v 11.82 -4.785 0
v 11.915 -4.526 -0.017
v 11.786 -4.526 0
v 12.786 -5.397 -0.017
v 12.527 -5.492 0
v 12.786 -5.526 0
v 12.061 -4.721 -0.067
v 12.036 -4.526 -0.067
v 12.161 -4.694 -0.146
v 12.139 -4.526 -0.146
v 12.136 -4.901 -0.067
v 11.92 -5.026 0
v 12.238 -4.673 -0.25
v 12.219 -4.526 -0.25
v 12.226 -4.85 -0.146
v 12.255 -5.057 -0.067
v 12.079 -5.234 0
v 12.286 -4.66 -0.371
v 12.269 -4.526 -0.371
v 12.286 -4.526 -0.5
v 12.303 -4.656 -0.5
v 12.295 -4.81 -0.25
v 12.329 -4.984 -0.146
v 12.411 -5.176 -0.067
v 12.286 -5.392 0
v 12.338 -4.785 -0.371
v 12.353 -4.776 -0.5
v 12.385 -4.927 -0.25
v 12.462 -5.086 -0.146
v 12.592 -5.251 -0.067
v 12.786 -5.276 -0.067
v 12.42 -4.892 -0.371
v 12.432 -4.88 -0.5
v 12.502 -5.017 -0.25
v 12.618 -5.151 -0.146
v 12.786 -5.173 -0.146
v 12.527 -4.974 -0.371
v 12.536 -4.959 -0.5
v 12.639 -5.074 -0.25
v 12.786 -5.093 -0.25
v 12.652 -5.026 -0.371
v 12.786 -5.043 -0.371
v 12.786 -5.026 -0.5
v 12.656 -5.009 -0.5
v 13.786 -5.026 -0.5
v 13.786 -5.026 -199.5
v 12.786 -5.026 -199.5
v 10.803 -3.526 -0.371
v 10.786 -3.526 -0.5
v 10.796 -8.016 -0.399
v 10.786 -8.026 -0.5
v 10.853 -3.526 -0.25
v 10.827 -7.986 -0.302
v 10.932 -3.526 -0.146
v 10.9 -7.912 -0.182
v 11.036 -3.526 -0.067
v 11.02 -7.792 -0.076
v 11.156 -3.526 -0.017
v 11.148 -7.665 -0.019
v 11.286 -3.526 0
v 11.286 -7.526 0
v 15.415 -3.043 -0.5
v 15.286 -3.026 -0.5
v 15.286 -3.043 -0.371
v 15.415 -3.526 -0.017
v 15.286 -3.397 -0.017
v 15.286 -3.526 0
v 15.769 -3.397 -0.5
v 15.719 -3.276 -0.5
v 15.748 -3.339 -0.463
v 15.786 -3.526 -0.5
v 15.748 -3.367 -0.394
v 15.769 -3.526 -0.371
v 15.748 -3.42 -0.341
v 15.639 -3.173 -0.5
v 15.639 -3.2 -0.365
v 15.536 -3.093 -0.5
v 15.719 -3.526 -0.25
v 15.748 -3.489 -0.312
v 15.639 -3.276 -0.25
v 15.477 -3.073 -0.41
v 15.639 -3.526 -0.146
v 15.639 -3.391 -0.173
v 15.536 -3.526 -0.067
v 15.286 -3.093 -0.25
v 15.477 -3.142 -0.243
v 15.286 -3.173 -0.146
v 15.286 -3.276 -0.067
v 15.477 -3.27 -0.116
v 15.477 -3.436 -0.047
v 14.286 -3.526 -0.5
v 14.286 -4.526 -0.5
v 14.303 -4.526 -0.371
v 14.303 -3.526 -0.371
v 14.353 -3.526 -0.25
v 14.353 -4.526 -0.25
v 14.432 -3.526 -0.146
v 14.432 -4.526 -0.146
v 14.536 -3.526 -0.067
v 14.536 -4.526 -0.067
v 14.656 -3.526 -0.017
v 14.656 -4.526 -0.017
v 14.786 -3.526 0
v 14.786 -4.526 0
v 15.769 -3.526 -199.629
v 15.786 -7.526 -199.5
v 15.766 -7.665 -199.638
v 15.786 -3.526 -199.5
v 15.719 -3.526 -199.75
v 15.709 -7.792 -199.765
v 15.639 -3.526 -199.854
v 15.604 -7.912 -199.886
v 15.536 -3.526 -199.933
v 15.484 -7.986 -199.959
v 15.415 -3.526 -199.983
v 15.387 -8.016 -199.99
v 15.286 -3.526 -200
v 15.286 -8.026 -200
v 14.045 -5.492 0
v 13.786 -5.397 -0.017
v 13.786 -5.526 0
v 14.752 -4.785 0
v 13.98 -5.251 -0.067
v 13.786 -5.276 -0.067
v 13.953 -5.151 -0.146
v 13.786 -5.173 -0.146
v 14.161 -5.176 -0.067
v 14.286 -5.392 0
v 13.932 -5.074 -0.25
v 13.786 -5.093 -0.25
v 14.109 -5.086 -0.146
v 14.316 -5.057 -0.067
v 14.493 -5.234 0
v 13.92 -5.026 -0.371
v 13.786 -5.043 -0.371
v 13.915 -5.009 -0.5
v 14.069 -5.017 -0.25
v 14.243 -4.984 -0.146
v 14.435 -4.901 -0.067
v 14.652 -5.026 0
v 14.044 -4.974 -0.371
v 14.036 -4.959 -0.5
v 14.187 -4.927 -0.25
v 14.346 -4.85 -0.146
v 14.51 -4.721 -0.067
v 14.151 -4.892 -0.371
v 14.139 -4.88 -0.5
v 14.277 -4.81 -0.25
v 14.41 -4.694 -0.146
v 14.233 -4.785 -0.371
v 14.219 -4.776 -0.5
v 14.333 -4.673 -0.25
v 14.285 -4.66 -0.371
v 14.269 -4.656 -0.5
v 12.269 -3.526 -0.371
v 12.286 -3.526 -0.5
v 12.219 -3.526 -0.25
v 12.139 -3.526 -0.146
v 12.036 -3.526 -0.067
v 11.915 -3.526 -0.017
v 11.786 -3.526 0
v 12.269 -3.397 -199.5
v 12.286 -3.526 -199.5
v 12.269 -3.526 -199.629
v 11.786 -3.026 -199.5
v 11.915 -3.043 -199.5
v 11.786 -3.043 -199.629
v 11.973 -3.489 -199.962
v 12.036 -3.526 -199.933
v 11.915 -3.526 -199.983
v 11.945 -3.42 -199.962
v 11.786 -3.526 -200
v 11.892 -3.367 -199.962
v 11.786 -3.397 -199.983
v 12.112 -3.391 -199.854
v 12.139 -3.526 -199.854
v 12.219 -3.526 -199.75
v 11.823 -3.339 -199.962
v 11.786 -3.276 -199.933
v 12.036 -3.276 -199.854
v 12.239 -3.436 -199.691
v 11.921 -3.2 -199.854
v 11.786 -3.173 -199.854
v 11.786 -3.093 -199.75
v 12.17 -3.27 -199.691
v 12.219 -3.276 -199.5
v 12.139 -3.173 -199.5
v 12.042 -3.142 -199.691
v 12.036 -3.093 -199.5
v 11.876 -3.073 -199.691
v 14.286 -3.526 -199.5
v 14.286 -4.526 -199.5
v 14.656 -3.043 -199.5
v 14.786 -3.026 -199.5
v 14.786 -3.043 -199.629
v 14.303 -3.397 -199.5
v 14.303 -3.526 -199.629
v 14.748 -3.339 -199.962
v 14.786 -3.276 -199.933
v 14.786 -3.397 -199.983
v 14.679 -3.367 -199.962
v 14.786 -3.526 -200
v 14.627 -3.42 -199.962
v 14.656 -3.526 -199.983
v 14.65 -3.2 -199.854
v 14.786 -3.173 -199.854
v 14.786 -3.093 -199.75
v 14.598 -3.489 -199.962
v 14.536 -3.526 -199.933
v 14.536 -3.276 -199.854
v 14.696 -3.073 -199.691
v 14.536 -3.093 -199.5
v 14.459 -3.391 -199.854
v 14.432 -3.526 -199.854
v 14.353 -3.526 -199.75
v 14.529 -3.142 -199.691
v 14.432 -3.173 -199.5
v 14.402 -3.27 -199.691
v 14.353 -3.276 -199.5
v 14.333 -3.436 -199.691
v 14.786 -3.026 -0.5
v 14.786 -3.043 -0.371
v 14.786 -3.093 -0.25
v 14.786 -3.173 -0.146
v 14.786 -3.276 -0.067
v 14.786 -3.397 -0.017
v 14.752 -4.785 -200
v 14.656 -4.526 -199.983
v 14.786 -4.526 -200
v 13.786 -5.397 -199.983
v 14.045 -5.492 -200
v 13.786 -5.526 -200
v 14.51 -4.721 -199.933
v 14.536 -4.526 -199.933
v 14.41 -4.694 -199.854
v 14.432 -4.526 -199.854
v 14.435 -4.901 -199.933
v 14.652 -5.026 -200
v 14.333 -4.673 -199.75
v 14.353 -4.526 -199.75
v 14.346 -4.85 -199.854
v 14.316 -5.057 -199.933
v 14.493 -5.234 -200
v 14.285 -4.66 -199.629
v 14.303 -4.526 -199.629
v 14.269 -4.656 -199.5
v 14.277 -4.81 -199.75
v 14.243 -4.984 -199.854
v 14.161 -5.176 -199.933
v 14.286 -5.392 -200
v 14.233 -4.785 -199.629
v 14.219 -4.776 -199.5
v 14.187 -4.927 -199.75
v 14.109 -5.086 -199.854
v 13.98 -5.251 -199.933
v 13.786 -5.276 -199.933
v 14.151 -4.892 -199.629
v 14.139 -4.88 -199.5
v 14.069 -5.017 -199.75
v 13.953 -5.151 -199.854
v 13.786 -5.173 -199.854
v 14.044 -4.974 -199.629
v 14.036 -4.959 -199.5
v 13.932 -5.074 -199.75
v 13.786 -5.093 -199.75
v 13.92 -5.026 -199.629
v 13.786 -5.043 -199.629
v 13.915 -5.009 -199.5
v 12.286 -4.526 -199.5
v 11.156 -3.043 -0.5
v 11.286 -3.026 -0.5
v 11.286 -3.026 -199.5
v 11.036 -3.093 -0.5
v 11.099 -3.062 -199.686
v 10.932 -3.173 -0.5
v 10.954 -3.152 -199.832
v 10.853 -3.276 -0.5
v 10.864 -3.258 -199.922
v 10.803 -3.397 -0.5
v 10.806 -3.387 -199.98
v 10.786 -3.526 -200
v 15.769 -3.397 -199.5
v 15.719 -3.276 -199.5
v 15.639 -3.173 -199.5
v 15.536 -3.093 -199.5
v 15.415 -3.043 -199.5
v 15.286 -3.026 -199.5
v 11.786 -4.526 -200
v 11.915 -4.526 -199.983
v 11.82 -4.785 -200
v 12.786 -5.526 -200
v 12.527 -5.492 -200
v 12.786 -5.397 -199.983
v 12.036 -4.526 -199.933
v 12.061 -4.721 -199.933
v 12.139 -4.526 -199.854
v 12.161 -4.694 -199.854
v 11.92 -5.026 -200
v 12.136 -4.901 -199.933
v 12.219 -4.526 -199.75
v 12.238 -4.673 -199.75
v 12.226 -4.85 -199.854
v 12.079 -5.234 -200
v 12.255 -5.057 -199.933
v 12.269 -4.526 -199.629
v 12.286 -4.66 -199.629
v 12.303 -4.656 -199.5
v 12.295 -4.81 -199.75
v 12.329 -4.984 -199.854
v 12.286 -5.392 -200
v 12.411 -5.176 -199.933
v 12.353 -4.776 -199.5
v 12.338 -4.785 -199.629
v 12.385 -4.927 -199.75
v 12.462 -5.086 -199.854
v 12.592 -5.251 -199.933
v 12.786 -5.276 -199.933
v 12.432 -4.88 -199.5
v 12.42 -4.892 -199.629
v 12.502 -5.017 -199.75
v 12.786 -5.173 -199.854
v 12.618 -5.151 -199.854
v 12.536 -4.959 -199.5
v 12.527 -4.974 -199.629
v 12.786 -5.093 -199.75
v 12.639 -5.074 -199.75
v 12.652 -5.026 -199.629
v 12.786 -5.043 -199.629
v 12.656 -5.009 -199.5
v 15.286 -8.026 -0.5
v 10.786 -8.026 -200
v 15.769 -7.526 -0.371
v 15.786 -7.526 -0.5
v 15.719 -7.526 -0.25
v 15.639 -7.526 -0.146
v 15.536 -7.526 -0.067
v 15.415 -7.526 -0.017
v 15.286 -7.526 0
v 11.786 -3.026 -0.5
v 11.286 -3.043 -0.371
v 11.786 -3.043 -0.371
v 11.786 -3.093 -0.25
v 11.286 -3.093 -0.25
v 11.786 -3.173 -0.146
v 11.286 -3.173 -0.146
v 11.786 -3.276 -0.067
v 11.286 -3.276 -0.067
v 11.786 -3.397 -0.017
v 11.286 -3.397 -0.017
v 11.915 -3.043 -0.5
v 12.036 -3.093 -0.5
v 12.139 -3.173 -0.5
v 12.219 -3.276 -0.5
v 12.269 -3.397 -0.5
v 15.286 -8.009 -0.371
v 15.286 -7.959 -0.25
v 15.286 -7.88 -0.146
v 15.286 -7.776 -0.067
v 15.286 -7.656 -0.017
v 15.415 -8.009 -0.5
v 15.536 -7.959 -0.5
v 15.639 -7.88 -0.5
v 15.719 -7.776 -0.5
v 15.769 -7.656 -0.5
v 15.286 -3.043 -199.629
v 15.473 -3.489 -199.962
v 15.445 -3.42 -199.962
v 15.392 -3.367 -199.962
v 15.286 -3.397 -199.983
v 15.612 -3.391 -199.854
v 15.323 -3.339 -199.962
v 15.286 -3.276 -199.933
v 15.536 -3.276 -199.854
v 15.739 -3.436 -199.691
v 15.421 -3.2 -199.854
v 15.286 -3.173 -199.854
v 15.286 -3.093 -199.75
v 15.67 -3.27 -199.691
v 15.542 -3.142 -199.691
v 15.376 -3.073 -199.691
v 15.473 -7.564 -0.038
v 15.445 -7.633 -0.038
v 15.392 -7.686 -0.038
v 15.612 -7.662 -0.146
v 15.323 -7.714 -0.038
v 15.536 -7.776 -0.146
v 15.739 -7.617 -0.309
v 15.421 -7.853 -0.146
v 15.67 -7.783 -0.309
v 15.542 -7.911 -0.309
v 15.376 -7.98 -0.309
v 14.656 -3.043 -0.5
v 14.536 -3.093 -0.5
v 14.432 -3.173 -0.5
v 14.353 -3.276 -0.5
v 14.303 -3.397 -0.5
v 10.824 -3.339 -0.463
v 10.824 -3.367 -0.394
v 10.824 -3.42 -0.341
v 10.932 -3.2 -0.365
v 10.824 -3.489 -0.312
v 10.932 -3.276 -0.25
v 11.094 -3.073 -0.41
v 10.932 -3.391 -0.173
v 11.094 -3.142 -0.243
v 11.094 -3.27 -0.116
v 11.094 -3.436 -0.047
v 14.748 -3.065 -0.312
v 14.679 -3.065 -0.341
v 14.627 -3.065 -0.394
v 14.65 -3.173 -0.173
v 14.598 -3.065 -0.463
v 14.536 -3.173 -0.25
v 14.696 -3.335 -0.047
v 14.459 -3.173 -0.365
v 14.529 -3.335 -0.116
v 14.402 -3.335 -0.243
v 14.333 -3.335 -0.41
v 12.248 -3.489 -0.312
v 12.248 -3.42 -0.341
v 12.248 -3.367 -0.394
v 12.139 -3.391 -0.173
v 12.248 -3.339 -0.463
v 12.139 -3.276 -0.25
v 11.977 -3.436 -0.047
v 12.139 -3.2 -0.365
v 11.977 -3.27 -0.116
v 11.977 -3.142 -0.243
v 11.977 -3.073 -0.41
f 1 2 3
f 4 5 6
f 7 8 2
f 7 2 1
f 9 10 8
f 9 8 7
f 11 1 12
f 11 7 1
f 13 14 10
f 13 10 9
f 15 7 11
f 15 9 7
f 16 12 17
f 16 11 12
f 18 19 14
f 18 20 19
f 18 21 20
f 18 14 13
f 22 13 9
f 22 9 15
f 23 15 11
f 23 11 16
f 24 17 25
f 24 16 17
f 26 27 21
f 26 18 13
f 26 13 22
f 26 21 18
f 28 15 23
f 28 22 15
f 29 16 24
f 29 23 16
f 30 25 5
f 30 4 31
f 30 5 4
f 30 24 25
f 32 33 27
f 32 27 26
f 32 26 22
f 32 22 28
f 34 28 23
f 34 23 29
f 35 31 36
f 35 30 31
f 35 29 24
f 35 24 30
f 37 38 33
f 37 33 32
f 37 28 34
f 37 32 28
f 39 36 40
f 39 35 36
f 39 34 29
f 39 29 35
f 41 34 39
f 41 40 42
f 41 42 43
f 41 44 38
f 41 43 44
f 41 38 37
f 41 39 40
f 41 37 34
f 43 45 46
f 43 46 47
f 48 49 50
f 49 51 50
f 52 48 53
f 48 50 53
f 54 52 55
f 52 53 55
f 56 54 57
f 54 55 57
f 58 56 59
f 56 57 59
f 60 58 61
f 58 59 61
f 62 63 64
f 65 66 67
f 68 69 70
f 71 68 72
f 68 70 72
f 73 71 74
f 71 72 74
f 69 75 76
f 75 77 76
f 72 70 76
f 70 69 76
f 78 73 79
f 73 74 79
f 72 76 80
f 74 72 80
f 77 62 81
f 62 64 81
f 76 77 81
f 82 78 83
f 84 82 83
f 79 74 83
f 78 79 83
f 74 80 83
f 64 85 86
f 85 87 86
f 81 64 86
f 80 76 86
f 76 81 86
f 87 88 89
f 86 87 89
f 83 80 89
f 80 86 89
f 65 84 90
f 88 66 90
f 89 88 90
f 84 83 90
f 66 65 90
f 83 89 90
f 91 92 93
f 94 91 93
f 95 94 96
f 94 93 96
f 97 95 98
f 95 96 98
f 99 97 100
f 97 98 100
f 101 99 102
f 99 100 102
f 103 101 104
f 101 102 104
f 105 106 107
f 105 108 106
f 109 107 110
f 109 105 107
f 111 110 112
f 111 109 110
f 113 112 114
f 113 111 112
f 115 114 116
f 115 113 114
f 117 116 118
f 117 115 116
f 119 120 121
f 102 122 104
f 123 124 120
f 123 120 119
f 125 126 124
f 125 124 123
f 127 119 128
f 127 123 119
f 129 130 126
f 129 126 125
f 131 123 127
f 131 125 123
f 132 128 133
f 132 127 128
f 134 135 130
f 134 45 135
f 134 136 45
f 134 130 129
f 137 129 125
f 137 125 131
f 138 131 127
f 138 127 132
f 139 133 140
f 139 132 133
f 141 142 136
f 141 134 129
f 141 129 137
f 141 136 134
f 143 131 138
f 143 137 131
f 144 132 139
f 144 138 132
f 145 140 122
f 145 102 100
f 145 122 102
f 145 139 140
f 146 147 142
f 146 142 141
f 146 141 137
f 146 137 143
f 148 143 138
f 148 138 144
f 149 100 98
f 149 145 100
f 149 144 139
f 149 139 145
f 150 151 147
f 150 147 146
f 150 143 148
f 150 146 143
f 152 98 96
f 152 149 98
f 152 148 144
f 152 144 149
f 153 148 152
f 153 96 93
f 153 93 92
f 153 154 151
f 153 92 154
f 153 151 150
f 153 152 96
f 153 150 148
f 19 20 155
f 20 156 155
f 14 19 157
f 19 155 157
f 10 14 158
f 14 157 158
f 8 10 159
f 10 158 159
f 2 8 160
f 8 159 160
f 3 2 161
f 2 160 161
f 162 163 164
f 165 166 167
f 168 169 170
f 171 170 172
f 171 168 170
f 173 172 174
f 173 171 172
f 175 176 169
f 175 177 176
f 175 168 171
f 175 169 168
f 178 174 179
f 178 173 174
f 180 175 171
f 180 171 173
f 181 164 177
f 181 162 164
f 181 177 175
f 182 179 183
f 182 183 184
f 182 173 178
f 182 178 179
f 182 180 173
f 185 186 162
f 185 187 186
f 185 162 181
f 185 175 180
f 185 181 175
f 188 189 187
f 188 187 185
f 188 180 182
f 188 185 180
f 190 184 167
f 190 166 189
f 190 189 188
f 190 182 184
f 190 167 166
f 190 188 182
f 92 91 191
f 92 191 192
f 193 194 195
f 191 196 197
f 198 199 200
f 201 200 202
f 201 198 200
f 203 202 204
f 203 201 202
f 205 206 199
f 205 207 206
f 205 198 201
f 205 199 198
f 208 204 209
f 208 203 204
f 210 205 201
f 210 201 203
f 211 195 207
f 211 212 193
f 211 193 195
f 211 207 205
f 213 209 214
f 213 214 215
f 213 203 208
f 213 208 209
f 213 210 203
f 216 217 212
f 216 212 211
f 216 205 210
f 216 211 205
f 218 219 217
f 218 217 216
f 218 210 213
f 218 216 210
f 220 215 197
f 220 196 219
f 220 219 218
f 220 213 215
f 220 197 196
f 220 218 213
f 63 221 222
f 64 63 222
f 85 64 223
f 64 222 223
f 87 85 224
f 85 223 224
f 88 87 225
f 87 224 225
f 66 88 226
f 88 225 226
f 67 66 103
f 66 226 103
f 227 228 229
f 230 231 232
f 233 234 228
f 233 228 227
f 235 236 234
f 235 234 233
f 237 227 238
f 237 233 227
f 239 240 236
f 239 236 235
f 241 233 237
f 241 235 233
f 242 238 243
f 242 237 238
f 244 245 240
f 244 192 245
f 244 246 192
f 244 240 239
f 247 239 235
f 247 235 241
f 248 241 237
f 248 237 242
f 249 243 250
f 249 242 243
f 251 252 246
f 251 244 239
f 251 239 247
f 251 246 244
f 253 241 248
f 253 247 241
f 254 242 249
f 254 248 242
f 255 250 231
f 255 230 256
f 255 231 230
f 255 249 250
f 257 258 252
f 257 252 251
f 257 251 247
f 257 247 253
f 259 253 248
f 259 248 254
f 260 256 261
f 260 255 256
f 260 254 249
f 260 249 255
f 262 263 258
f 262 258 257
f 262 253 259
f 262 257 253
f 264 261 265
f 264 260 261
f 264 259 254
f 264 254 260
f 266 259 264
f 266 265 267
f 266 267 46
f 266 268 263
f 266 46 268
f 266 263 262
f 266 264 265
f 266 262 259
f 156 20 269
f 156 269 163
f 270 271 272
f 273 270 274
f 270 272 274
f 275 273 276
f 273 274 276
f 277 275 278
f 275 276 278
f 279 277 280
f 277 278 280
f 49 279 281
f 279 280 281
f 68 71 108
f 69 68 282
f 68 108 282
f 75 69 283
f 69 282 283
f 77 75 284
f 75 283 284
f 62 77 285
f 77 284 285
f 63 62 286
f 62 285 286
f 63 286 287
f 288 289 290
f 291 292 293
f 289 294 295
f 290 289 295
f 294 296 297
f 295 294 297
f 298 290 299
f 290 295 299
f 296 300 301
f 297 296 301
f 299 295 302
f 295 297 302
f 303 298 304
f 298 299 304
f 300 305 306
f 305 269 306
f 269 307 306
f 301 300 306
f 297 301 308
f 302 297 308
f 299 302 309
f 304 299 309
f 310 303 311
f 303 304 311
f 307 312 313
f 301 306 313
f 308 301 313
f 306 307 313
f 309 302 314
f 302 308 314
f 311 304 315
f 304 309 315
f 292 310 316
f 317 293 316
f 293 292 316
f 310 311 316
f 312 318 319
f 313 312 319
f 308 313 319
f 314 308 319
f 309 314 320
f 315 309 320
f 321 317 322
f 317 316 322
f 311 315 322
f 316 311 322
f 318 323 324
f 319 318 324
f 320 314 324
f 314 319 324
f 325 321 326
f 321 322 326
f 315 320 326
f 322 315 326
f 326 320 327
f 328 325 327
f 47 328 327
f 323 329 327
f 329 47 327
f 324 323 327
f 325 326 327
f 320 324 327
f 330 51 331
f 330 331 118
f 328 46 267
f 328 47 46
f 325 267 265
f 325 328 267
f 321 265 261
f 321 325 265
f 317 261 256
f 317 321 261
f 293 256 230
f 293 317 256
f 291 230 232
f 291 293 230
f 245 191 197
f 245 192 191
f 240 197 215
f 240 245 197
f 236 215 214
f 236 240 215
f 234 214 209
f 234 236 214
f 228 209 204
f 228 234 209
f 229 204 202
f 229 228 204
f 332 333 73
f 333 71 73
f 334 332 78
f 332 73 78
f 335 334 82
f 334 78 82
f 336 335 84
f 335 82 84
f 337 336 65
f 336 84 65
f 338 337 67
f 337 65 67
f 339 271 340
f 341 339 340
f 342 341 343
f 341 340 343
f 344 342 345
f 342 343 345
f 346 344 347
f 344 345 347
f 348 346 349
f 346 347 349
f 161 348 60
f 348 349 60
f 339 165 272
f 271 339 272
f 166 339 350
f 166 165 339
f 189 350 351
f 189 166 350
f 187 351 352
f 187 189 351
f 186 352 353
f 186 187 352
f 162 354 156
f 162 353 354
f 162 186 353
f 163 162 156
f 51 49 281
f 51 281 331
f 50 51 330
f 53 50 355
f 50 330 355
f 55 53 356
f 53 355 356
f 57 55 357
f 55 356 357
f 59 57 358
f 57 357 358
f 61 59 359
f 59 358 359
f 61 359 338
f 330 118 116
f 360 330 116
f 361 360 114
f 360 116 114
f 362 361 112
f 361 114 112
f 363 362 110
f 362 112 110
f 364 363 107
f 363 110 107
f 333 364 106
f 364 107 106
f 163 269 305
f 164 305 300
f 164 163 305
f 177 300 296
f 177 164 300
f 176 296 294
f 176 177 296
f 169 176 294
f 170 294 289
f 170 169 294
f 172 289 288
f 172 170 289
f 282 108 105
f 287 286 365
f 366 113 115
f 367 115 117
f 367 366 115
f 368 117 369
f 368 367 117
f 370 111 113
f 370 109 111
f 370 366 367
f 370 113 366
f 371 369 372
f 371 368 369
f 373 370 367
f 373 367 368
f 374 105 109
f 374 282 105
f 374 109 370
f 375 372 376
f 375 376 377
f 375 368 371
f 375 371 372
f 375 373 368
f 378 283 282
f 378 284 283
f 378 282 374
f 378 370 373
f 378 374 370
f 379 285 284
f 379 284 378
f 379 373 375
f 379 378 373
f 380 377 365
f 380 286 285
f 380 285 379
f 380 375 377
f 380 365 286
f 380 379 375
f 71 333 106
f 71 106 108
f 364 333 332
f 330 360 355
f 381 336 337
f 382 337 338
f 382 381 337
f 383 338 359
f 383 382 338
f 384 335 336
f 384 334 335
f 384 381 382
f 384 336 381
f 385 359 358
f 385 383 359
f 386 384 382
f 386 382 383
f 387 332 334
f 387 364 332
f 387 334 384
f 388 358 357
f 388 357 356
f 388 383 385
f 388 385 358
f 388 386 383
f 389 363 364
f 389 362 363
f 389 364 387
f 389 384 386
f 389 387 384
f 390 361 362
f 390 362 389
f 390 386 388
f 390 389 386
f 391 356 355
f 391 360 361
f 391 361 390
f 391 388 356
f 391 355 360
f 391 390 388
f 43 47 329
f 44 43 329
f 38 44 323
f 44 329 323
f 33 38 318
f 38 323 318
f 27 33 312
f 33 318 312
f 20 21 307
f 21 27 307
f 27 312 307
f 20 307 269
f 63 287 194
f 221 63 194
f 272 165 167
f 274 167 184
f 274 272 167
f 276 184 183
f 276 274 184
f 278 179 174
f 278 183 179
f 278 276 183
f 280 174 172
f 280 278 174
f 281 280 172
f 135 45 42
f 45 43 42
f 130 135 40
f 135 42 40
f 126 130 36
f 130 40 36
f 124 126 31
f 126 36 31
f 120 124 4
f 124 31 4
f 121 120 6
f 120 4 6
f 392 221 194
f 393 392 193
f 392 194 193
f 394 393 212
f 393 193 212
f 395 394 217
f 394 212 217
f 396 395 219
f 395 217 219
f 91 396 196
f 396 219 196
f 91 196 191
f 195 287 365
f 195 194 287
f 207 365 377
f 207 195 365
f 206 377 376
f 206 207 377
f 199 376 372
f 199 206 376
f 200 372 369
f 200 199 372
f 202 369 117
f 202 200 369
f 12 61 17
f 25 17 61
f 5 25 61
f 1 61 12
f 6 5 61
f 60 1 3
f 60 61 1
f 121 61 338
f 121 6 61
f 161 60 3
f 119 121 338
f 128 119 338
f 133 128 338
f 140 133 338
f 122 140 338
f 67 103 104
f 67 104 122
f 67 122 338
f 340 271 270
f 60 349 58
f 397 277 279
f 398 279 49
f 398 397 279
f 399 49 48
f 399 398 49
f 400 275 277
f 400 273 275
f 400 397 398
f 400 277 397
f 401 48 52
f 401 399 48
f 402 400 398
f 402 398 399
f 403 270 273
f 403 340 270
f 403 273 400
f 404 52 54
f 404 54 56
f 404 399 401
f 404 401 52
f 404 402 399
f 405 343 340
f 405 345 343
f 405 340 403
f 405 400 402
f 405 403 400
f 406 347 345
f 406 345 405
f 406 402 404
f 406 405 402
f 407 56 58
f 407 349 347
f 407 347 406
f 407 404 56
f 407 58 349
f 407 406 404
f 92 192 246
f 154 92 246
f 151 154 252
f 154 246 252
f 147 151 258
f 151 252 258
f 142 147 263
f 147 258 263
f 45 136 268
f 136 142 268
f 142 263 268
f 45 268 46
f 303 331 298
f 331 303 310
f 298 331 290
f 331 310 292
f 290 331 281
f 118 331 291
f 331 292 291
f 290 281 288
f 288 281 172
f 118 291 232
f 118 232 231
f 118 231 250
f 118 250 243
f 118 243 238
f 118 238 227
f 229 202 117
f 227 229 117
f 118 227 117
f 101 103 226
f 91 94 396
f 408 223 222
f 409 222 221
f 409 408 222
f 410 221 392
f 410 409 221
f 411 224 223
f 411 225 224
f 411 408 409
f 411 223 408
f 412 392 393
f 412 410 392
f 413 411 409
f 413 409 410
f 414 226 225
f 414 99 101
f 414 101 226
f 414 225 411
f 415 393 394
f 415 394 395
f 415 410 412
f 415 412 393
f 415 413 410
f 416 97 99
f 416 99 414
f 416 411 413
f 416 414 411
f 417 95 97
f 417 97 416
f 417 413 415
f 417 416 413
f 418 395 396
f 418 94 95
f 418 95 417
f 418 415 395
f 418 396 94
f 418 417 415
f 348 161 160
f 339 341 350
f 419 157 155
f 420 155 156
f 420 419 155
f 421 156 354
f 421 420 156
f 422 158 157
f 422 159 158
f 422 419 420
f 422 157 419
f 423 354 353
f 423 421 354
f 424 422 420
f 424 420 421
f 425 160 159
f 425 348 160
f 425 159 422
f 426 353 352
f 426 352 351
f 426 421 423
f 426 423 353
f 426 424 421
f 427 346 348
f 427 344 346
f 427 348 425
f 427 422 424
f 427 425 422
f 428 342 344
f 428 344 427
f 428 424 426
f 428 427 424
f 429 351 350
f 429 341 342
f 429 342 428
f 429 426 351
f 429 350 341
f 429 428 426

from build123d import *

# Parameters (mm, degrees)
BOSS_EXTRUDE1_DEPTH = 200
FILLET1_R           = 0.5


with BuildPart() as part:
    # Sketch1 → Boss-Extrude1 (new body)
    with BuildSketch(Plane.XY):
        Polygon((12.285714286, -3.026455026), (10.785714286, -3.026455026), (10.785714286, -8.026455026), (15.785714286, -8.026455026), (15.785714286, -3.026455026), (14.285714286, -3.026455026), (14.285714286, -5.026455026), (12.285714286, -5.026455026), align=None)
    extrude(amount=-BOSS_EXTRUDE1_DEPTH)

    # Fillet1
    fillet1_edges = [part.edges().sort_by_distance(p)[0] for p in [
        (11.535714286, -3.026455026, 0),
        (12.285714286, -4.026455026, 0),
        (13.285714286, -5.026455026, 0),
        (14.285714286, -4.026455026, 0),
        (15.035714286, -3.026455026, 0),
        (13.285714286, -5.026455026, -200),
        (15.785714286, -3.026455026, -100),
        (15.785714286, -8.026455026, -100),
        (10.785714286, -3.026455026, -100),
        (12.285714286, -3.026455026, -100),
        (12.285714286, -5.026455026, -100),
        (14.285714286, -5.026455026, -100),
        (14.285714286, -3.026455026, -100),
        (12.285714286, -4.026455026, -200),
        (11.535714286, -3.026455026, -200),
        (15.785714286, -5.526455026, -200),
        (15.035714286, -3.026455026, -200),
        (15.785714286, -5.526455026, 0),
        (14.285714286, -4.026455026, -200),
        (13.285714286, -8.026455026, 0),
        (10.785714286, -5.526455026, 0),
    ]]
    fillet(fillet1_edges, radius=FILLET1_R)


solid = part.part
